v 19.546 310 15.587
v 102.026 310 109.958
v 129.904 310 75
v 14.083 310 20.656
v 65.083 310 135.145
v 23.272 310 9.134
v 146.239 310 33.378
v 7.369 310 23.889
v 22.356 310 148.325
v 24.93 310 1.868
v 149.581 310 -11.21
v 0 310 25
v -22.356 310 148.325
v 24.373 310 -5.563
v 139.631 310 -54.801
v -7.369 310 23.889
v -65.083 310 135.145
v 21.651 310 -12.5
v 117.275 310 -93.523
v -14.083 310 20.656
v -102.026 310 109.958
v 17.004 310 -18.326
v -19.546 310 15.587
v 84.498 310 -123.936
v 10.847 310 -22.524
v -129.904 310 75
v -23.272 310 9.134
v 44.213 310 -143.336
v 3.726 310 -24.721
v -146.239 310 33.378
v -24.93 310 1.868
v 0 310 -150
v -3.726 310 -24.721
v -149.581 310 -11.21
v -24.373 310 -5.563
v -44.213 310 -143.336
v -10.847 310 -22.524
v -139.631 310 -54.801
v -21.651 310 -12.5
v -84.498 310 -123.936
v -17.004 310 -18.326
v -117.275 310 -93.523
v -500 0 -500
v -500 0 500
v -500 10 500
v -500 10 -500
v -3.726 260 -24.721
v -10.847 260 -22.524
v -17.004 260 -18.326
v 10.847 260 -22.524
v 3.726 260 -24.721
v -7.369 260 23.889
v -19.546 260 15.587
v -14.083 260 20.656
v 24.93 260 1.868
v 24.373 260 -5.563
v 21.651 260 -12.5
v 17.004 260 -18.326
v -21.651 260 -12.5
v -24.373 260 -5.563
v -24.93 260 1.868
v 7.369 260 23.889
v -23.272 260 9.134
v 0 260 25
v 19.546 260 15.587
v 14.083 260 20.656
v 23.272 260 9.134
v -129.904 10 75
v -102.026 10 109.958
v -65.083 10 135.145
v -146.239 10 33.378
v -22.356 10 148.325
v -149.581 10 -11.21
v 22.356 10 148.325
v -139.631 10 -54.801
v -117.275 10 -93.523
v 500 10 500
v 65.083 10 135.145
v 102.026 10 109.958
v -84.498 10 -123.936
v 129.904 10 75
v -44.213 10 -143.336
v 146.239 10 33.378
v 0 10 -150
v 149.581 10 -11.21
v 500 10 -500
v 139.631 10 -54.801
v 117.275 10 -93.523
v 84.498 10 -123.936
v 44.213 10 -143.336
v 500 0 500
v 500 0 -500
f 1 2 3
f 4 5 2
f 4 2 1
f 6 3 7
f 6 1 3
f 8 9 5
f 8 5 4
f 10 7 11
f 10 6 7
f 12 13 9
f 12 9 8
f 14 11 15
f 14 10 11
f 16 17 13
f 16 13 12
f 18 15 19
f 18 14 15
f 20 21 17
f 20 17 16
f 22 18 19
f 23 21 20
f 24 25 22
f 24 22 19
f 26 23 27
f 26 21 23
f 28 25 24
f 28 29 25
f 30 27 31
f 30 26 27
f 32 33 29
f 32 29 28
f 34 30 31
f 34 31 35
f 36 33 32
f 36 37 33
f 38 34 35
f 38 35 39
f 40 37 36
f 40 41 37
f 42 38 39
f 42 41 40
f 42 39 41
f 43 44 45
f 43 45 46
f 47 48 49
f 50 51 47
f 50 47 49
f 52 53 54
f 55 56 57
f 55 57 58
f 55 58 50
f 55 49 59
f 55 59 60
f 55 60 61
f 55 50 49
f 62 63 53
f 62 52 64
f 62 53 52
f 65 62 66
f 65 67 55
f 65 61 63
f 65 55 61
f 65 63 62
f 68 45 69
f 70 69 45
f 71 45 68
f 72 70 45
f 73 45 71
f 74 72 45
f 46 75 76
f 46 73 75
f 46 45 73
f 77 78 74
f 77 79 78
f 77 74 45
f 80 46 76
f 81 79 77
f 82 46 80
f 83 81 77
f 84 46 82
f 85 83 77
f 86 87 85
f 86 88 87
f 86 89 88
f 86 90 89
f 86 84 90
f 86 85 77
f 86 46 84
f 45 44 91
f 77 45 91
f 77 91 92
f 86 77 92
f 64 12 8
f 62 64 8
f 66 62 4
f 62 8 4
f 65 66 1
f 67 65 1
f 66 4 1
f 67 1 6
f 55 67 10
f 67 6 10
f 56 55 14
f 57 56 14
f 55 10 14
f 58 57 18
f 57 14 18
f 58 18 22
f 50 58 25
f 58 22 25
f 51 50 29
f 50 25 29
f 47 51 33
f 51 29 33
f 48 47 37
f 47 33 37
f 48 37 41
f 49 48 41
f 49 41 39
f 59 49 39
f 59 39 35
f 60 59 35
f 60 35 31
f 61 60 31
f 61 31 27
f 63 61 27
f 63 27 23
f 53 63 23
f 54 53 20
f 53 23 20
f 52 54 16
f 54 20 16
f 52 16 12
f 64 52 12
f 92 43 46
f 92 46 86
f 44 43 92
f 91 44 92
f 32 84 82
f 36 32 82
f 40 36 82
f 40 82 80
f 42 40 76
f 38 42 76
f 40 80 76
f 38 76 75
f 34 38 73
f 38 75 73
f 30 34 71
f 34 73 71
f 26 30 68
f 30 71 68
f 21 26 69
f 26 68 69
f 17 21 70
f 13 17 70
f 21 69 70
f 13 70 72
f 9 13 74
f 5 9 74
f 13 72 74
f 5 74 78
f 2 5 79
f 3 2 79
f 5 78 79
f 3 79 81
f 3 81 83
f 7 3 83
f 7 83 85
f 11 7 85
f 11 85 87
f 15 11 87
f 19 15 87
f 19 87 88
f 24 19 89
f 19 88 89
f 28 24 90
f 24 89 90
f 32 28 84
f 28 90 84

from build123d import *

# Parameters (mm, degrees)
SKETCH1_W           = 1000
SKETCH1_H           = 1000
BOSS_EXTRUDE1_DEPTH = 10
SKETCH2_R           = 150
BOSS_EXTRUDE2_DEPTH = 300
SKETCH3_R           = 25
CUT_EXTRUDE1_DEPTH  = 50


with BuildPart() as part:
    # Sketch1 → Boss-Extrude1 (new body)
    with BuildSketch(Plane(origin=(0, 0, 0), x_dir=(1, 0, 0), z_dir=(0, 1, 0))):
        Rectangle(SKETCH1_W, SKETCH1_H)
    extrude(amount=BOSS_EXTRUDE1_DEPTH)

    # Sketch2 → Boss-Extrude2 (add)
    with BuildSketch(Plane(origin=(0, 10, 0), x_dir=(1, 0, 0), z_dir=(0, 1, 0))):
        with Locations(Location((0, 0, 0), (0, 0, 90))):
            Circle(SKETCH2_R)
    extrude(amount=BOSS_EXTRUDE2_DEPTH)

    # Sketch3 → Cut-Extrude1 (cut)
    with BuildSketch(Plane(origin=(0, 310, 0), x_dir=(1, 0, 0), z_dir=(0, 1, 0))):
        with Locations(Location((0, 0, 0), (0, 0, 270))):
            Circle(SKETCH3_R)
    extrude(amount=-CUT_EXTRUDE1_DEPTH, mode=Mode.SUBTRACT)


solid = part.part
